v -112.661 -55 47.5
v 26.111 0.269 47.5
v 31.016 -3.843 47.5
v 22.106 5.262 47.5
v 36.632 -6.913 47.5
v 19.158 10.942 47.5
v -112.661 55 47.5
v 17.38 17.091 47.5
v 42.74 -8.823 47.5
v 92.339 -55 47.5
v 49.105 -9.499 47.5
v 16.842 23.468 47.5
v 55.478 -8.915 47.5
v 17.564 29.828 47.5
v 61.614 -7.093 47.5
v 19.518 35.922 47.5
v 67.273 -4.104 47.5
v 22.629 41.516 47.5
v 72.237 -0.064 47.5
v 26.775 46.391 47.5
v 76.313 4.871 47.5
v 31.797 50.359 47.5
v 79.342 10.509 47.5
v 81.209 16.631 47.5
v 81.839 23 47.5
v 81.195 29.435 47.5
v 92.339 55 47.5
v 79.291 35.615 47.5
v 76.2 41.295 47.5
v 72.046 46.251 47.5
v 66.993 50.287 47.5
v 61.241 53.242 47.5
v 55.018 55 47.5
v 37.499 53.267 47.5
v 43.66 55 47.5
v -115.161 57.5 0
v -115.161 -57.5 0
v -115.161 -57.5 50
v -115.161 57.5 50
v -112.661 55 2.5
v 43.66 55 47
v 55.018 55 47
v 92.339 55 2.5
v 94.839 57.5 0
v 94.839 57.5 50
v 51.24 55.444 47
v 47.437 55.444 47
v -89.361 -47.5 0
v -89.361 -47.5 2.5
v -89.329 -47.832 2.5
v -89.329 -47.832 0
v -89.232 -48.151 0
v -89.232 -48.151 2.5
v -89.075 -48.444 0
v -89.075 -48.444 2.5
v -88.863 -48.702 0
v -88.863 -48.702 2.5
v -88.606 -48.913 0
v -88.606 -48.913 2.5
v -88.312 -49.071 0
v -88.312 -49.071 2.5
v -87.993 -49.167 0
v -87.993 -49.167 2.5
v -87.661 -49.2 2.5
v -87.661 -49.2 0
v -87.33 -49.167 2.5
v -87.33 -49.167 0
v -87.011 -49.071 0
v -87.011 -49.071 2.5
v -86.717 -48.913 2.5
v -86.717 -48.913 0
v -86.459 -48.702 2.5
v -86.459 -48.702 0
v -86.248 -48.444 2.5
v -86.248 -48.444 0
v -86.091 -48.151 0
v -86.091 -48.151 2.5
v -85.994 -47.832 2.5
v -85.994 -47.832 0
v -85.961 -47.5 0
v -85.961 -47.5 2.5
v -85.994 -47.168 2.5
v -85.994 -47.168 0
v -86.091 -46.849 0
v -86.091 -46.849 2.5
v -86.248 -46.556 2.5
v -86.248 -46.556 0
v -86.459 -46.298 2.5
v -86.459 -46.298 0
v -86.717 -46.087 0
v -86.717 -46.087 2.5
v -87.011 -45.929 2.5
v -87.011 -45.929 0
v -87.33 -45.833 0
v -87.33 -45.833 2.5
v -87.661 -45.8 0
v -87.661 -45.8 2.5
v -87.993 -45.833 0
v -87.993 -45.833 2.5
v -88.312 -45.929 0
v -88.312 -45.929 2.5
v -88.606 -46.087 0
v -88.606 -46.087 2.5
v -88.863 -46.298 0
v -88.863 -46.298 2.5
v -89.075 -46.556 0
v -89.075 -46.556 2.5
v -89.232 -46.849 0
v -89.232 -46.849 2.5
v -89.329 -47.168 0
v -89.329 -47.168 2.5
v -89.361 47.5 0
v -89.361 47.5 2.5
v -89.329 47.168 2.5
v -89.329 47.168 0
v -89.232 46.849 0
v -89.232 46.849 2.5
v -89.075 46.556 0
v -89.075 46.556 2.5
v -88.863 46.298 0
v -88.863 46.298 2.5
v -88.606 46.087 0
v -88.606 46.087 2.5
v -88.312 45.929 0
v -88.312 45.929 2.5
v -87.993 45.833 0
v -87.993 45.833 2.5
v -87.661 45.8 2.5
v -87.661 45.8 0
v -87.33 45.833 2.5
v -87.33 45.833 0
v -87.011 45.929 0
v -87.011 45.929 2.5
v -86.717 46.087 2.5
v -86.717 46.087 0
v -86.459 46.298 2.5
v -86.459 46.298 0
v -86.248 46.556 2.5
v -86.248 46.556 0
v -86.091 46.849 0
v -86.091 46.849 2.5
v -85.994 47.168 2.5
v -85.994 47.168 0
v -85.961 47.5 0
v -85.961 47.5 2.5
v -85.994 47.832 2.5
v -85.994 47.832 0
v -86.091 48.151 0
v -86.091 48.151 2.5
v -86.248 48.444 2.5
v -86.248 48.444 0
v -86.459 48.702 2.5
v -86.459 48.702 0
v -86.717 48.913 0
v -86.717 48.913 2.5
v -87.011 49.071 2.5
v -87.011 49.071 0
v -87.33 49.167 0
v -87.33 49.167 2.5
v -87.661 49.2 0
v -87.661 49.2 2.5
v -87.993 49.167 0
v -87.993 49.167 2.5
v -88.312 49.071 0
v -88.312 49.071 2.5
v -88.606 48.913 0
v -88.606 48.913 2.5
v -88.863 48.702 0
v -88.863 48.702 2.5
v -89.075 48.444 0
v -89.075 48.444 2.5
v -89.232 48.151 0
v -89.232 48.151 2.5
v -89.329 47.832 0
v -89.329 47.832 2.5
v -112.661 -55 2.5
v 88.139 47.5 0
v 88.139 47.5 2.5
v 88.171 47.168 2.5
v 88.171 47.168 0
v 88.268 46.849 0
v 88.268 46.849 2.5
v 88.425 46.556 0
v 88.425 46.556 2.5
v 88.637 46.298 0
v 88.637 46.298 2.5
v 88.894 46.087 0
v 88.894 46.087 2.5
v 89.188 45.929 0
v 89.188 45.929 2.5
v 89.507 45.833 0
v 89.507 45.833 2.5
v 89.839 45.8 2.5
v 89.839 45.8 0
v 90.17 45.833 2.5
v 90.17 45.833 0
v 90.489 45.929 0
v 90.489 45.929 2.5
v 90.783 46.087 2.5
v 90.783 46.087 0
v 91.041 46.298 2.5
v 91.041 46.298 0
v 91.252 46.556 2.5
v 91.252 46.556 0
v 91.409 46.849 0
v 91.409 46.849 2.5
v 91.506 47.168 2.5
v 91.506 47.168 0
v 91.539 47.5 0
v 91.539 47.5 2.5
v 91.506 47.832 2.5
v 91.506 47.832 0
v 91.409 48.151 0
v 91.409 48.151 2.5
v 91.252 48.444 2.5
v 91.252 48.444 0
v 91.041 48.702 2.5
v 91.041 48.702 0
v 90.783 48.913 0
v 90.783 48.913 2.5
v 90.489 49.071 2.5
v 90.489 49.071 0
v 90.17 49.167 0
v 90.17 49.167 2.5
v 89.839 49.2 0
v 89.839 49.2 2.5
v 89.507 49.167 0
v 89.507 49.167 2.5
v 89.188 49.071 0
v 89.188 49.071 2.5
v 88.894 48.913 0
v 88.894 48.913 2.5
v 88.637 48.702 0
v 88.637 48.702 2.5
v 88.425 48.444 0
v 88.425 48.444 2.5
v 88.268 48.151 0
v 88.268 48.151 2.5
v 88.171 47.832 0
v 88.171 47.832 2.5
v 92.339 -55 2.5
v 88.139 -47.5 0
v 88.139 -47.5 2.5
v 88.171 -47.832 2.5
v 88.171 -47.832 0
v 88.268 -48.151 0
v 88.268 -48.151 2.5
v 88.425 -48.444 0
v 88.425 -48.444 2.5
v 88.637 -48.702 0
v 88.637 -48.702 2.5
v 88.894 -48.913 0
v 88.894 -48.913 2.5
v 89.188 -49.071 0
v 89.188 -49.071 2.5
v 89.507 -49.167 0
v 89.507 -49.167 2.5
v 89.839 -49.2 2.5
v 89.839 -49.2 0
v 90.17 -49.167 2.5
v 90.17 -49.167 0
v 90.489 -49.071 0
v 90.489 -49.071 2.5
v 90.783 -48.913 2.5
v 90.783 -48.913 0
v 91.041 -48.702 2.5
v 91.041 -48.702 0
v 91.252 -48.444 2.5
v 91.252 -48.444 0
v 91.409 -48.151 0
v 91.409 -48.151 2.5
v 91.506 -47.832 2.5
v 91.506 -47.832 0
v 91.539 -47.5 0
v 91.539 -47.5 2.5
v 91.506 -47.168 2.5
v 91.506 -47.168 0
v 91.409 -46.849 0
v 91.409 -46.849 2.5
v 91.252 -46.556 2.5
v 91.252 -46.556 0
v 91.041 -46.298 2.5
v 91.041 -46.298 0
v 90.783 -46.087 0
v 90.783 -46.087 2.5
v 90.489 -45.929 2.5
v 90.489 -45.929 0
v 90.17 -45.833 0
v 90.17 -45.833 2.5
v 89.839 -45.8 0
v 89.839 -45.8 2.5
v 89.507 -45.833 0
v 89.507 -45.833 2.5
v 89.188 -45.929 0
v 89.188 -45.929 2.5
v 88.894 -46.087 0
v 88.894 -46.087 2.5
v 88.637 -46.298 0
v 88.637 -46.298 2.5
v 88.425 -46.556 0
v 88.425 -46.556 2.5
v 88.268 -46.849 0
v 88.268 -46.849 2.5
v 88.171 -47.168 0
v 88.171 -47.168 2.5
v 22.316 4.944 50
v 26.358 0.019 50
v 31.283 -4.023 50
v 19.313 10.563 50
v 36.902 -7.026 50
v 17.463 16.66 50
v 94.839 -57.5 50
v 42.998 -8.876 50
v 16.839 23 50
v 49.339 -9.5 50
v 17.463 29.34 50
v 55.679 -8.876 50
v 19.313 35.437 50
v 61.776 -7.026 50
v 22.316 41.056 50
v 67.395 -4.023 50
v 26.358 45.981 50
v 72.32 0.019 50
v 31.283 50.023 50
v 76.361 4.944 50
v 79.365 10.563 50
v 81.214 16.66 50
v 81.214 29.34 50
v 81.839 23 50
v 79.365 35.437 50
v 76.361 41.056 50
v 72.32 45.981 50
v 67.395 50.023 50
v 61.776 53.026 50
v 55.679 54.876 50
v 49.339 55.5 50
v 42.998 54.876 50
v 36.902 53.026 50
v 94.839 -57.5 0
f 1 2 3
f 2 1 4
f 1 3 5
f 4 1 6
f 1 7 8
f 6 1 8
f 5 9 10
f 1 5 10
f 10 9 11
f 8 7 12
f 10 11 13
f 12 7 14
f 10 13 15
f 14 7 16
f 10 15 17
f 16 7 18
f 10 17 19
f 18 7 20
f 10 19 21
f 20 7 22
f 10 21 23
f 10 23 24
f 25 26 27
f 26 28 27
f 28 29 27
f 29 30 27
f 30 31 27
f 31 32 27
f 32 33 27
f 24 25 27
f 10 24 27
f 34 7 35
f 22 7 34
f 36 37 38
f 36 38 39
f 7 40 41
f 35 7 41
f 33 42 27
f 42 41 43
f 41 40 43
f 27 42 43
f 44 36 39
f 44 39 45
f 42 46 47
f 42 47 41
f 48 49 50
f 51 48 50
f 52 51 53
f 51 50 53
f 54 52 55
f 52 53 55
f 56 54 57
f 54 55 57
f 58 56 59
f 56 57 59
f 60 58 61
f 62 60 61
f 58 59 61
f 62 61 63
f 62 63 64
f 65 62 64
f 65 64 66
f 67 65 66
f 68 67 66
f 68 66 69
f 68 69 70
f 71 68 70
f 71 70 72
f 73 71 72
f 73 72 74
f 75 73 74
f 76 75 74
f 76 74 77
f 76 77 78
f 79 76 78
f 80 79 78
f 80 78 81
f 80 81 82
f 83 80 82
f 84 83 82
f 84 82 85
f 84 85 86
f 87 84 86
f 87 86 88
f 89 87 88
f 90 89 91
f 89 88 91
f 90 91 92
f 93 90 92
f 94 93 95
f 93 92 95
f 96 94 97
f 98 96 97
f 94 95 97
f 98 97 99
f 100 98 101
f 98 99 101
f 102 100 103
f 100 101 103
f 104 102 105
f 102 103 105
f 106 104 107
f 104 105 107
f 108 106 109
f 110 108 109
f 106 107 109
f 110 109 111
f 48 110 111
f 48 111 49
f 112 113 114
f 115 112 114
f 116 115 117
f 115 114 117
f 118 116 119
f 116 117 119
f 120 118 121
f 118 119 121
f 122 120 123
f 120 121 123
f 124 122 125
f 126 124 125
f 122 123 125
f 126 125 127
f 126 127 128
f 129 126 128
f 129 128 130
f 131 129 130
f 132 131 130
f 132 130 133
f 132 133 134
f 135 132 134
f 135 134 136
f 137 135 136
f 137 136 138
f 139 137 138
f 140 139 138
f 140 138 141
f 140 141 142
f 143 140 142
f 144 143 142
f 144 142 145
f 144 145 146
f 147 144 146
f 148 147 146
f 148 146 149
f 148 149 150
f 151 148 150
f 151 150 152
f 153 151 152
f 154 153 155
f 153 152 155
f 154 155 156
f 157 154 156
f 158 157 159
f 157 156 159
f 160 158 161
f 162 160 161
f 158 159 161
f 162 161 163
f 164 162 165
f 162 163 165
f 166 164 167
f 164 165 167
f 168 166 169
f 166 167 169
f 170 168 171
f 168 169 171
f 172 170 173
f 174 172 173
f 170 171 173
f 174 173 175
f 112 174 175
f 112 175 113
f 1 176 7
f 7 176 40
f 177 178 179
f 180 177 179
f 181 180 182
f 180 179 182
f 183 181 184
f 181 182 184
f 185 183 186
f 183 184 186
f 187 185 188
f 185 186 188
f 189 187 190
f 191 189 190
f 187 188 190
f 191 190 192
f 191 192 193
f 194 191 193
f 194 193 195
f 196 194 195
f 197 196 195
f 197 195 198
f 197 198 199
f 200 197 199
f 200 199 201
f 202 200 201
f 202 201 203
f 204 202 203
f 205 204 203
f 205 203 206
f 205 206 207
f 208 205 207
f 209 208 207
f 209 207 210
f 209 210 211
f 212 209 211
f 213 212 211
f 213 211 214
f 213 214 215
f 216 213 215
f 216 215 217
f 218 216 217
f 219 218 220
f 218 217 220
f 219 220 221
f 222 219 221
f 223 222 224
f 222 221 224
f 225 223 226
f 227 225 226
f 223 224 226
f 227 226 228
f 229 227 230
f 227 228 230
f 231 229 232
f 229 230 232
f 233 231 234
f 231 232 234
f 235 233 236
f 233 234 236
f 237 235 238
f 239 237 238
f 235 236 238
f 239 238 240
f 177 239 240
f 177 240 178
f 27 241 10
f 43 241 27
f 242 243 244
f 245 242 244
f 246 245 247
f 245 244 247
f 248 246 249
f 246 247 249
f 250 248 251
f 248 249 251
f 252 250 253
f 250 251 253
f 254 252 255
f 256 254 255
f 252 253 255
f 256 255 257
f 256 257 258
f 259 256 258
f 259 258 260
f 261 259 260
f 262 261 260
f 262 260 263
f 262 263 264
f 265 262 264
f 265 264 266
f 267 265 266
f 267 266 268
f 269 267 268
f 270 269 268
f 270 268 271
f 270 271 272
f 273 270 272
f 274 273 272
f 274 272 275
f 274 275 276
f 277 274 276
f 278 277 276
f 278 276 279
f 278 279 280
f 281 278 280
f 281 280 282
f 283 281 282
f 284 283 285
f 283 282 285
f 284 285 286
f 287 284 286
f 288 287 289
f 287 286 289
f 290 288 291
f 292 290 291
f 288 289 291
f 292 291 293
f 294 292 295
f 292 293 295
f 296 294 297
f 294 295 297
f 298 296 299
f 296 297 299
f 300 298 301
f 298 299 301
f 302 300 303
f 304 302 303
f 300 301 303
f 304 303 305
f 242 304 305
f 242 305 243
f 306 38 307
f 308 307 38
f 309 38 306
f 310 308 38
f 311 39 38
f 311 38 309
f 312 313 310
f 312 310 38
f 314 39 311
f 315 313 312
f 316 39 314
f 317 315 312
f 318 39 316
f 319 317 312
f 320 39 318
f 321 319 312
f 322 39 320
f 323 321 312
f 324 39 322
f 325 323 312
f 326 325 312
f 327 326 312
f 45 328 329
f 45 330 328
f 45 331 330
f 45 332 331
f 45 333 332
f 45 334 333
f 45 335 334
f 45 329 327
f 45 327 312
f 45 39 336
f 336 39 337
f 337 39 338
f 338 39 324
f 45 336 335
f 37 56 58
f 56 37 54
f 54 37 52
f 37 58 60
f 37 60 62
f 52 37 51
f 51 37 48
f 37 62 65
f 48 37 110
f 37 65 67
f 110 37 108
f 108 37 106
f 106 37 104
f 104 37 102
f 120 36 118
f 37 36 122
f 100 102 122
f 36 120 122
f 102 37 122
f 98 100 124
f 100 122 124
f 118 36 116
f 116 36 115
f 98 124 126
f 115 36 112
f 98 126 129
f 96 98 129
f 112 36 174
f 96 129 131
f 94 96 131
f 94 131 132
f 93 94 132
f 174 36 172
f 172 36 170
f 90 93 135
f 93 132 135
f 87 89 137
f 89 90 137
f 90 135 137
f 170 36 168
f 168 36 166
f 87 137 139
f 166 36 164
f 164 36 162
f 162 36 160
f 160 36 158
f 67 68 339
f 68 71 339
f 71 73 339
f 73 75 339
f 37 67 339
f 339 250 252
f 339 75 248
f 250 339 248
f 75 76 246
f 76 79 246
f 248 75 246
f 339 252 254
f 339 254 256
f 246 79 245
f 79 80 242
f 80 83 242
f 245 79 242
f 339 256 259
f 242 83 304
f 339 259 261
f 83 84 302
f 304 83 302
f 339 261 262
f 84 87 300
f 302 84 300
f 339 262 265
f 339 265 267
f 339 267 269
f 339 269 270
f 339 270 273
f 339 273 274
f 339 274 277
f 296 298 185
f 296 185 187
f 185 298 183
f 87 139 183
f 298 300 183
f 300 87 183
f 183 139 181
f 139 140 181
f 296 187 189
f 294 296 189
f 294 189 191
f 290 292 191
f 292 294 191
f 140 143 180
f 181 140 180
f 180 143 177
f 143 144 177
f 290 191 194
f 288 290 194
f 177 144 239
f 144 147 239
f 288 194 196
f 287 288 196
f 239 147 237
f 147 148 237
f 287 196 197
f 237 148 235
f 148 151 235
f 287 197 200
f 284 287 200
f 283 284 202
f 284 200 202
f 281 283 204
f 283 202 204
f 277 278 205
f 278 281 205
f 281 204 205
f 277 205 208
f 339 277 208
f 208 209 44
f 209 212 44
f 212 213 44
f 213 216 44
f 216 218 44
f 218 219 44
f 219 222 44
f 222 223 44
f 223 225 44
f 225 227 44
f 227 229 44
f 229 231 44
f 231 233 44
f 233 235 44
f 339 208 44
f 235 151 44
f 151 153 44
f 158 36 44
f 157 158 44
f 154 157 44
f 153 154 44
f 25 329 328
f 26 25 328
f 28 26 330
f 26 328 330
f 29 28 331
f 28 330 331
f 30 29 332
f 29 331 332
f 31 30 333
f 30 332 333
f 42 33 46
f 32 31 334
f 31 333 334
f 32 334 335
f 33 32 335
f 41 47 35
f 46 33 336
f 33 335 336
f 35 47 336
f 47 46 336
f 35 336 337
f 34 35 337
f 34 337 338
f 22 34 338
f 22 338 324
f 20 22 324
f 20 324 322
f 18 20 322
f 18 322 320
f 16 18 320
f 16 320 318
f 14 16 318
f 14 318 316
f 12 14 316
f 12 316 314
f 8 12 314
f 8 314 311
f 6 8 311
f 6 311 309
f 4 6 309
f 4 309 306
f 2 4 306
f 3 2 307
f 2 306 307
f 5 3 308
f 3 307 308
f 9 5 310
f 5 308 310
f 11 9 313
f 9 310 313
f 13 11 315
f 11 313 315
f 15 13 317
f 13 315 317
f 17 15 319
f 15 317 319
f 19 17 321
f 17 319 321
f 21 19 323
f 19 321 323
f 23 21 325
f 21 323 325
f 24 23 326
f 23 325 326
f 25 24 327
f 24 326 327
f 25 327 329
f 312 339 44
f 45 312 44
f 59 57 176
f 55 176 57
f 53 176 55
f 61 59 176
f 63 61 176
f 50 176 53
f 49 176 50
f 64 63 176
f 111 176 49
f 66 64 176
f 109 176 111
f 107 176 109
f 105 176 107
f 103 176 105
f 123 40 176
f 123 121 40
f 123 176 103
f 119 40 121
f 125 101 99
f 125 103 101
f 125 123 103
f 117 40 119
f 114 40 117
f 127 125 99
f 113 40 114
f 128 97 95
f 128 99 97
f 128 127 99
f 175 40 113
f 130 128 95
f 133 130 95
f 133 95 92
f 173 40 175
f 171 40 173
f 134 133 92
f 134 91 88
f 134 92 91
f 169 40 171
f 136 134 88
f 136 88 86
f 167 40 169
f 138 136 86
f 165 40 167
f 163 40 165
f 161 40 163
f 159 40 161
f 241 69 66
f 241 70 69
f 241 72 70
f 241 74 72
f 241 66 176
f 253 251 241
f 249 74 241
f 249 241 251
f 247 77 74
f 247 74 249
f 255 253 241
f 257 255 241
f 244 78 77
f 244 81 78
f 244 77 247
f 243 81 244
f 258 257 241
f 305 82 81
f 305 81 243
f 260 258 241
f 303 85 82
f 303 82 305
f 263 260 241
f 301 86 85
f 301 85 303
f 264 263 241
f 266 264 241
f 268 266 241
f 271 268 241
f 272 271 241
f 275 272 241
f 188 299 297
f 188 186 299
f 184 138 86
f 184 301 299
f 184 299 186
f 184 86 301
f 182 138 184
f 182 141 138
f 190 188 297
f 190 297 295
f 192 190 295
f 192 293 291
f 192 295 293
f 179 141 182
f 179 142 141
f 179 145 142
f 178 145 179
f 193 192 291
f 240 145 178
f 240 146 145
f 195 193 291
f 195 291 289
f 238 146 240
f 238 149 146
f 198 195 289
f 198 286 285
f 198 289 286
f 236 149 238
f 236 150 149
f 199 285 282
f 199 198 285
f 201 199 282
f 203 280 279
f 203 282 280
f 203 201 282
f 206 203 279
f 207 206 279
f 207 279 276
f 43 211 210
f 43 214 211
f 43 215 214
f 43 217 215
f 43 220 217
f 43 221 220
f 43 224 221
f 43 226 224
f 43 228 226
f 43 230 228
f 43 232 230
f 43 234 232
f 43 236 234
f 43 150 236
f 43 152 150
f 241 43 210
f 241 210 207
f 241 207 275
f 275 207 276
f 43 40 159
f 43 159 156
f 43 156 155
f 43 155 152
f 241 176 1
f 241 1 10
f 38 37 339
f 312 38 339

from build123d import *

# Parameters (mm, degrees)
F0_W     = 210
F0_H     = 115
F1_DEPTH = 50
F3_T     = -2.5
F2_R     = 32.5
F4_DEPTH = 3
F6_D     = 3.4
F6_DEPTH = 4
F6_TIP   = 1.0214630523


with BuildPart() as f1:
    # F0 (on Top) → F1 (new body)
    with BuildSketch(Plane.XY):
        with Locations((-10.1612838779, 0)):
            Rectangle(F0_W, F0_H)
    extrude(amount=F1_DEPTH)

    # F3 (hollow: no face is removed)
    offset(amount=F3_T, mode=Mode.SUBTRACT)

    # F2 (on face) → F4 (cut)
    with BuildSketch(Plane.XY.offset(50)):
        with Locations((49.3387161221, 23)):
            Circle(F2_R)
    extrude(amount=-F4_DEPTH, mode=Mode.SUBTRACT)

    # F6
    with Locations(Plane(origin=(0, 0, 0), x_dir=(1, 0, 0), z_dir=(0, 0, -1))):
        with Locations((-87.6612838779, 47.5), (89.8387161221, 47.5), (89.8387161221, -47.5), (-87.6612838779, -47.5)):
            Hole(F6_D / 2, depth=F6_DEPTH)
            with Locations((0, 0, -(F6_DEPTH + F6_TIP / 2))):  # 118° drill point
                Cone(0, F6_D / 2, F6_TIP, mode=Mode.SUBTRACT)


solid = f1.part
